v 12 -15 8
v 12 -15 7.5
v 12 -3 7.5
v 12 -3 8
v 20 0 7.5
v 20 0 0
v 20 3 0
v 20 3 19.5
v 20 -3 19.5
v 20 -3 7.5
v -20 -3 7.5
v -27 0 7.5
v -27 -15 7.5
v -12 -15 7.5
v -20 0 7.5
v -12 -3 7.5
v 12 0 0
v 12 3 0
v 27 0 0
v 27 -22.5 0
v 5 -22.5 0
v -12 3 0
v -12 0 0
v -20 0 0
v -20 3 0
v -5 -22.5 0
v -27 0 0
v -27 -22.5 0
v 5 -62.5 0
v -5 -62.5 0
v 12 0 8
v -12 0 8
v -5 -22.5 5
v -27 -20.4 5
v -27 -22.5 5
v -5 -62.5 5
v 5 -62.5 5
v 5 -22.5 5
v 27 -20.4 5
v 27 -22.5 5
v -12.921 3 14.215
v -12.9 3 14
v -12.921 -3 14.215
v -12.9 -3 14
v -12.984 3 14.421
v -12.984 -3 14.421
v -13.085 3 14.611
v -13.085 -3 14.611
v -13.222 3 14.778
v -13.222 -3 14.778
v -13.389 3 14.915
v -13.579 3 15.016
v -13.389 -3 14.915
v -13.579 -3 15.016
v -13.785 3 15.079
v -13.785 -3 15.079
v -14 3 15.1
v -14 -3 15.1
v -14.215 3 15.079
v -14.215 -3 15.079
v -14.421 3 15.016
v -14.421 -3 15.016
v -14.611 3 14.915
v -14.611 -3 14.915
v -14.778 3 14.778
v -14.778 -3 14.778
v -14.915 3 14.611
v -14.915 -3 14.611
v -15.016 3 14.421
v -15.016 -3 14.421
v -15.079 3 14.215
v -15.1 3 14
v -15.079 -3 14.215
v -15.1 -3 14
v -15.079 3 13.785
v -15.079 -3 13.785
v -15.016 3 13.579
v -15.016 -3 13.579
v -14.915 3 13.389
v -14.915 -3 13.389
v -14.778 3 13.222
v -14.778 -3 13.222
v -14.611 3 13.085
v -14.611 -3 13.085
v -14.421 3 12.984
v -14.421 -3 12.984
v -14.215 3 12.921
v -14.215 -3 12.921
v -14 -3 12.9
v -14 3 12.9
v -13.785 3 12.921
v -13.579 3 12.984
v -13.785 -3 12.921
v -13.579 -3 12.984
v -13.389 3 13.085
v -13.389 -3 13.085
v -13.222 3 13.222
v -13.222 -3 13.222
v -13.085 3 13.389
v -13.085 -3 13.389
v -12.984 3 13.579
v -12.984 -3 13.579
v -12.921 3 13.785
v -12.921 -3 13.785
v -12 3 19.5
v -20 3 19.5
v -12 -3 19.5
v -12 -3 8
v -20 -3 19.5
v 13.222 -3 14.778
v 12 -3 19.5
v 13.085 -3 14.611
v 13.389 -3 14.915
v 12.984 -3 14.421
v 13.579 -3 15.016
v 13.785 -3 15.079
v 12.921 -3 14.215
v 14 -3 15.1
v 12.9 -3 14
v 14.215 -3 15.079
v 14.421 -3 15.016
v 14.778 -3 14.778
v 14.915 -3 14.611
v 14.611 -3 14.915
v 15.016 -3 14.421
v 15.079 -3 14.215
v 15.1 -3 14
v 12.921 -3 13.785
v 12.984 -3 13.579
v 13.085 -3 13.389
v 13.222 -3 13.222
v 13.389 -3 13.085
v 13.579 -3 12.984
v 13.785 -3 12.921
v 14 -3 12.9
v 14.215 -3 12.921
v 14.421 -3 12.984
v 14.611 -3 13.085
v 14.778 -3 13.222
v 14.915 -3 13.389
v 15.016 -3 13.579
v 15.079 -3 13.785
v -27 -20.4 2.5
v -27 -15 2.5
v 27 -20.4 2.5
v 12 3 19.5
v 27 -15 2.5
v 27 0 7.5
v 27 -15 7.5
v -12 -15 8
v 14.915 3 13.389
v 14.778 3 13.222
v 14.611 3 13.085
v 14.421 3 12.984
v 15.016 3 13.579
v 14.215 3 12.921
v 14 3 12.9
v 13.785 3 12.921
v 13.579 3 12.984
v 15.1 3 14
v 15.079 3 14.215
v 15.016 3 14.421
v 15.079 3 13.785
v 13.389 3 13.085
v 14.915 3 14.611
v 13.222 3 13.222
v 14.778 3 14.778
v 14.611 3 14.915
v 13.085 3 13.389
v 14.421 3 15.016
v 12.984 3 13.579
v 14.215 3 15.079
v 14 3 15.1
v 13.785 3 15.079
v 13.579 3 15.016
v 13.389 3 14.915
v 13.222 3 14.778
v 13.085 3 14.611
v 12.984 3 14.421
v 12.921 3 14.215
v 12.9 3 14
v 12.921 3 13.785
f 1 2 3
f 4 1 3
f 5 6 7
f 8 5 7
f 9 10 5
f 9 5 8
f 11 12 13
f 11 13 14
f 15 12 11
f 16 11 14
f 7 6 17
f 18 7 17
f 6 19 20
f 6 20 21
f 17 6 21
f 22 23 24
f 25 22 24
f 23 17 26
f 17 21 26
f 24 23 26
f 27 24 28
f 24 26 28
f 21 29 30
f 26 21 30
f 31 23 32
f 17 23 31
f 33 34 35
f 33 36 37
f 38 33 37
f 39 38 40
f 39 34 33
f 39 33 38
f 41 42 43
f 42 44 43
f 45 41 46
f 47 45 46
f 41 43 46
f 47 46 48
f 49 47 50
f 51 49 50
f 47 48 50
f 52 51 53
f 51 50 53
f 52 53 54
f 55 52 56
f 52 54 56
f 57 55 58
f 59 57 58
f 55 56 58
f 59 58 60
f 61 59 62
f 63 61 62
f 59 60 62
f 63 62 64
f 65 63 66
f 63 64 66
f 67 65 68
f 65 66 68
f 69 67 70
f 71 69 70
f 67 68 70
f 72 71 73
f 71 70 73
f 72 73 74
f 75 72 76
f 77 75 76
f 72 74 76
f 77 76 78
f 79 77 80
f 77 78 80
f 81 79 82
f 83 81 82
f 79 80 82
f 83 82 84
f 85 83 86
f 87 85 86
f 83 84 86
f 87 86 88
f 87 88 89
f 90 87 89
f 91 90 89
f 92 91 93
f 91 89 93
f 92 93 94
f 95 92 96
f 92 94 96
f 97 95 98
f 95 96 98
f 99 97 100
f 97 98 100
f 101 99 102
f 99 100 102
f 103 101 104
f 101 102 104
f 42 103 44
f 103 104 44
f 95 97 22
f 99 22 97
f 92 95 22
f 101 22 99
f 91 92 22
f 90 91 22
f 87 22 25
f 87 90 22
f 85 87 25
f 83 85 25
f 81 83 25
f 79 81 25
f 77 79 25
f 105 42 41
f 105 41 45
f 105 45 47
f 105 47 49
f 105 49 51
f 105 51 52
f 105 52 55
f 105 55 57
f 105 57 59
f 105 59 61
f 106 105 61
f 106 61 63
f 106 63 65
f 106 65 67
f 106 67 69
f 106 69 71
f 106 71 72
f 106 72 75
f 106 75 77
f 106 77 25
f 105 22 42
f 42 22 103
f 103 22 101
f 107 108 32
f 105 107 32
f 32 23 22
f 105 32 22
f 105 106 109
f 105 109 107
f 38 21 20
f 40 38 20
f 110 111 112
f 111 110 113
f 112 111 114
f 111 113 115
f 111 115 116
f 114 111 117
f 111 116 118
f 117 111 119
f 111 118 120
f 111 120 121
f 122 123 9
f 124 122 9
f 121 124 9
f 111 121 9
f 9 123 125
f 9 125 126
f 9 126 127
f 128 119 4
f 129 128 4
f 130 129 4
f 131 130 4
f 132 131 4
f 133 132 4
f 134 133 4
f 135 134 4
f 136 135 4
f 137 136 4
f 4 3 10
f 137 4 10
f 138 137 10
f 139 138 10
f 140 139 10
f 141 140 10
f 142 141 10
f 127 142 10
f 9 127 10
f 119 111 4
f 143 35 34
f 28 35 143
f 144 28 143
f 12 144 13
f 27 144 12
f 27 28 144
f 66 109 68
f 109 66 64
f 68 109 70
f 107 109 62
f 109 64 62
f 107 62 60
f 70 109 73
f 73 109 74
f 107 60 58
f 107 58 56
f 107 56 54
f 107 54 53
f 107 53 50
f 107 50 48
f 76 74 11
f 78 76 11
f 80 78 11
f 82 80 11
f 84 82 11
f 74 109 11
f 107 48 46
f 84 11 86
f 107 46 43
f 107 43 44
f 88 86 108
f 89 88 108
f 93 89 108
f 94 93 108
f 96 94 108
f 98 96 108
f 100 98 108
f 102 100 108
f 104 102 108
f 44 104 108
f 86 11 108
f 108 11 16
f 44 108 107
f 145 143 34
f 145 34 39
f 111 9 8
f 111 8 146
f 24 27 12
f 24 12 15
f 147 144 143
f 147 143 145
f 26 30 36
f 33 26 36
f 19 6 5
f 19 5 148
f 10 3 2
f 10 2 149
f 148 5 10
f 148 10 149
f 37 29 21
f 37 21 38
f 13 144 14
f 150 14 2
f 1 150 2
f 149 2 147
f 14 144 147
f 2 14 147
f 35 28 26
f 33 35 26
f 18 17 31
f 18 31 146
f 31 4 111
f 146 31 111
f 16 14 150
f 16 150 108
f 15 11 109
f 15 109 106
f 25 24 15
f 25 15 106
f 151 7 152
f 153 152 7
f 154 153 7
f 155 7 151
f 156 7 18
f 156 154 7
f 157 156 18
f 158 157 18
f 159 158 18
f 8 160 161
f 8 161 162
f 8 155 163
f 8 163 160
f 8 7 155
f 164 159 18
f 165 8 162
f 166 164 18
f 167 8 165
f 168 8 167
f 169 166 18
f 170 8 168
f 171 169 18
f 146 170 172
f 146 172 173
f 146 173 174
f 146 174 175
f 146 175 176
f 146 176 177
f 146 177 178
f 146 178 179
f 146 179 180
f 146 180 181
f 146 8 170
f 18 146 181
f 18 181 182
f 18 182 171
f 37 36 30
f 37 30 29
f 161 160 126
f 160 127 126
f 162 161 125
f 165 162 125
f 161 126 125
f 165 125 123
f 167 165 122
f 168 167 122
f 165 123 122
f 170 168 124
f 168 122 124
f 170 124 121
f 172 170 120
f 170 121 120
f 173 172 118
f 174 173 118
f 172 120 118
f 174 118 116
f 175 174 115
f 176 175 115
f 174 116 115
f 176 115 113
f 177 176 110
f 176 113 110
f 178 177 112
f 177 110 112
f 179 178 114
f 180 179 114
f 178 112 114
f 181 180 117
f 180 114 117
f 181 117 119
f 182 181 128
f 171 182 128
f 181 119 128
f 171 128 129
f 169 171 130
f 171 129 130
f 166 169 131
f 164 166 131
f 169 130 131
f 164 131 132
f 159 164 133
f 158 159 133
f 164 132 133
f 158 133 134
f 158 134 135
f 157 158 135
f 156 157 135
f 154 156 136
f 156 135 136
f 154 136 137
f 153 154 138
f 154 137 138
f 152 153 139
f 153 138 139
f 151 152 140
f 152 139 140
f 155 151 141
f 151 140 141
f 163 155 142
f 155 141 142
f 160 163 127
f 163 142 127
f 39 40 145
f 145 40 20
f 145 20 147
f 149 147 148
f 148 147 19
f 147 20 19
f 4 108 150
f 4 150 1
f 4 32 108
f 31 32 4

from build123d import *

# Parameters (mm, degrees)
SKETCH_W        = 54
SKETCH_H        = 22.5
PAD_DEPTH       = 2.5
SKETCH001_W     = 54
SKETCH001_H     = 2.1
PAD001_DEPTH    = 2.5
SKETCH002_W     = 10
SKETCH002_H     = 5
PAD002_DEPTH    = 40
SKETCH003_W     = 54
SKETCH003_H     = 15
PAD003_DEPTH    = 5
SKETCH004_W     = 8
SKETCH004_H     = 3
PAD004_DEPTH    = 12
SKETCH005_R     = 1.1
POCKET_DEPTH    = 10
SKETCH006_W     = 8
SKETCH006_H     = 19.5
PAD005_DEPTH    = 3
SKETCH007_R     = 1.1
POCKET001_DEPTH = 5
SKETCH008_W     = 24
SKETCH008_H     = 15
PAD006_DEPTH    = 0.5


with BuildPart() as part:
    # Sketch → Pad (new body)
    with BuildSketch(Plane.XY):
        with Locations((0, -11.25)):
            Rectangle(SKETCH_W, SKETCH_H)
    extrude(amount=PAD_DEPTH)

    # Sketch001 (on Face6 of Pad) → Pad001 (join)
    with BuildSketch(Plane.XY.offset(2.5)):
        with Locations((0, -21.45)):
            Rectangle(SKETCH001_W, SKETCH001_H)
    extrude(amount=PAD001_DEPTH)

    # Sketch002 (on Face10 of Pad001) → Pad002 (join)
    with BuildSketch(Plane.XZ.offset(22.5)):
        with Locations((0, 2.5)):
            Rectangle(SKETCH002_W, SKETCH002_H)
    extrude(amount=PAD002_DEPTH)

    # Sketch003 (on Face5 of Pad002) → Pad003 (join)
    with BuildSketch(Plane.XY.offset(2.5)):
        with Locations((0, -7.5)):
            Rectangle(SKETCH003_W, SKETCH003_H)
    extrude(amount=PAD003_DEPTH)

    # Sketch004 (on Face14 of Pad003) → Pad004 (join)
    with BuildSketch(Plane.XY.offset(7.5)):
        with Locations((16, -1.5)):
            Rectangle(SKETCH004_W, SKETCH004_H)
        with Locations((-16, -1.5)):
            Rectangle(SKETCH004_W, SKETCH004_H)
    extrude(amount=PAD004_DEPTH)

    # Sketch005 (on Face26 of Pad004) → Pocket (cut)
    with BuildSketch(Plane.XZ.offset(3)):
        with Locations((-14, 14)):
            Circle(SKETCH005_R)
        with Locations((14, 14)):
            Circle(SKETCH005_R)
    extrude(amount=-POCKET_DEPTH, mode=Mode.SUBTRACT)

    # Sketch006 (on Face5 of Pocket) → Pad005 (join)
    with BuildSketch(Plane(origin=(0, 0, 0), x_dir=(-1, 0, 0), z_dir=(0, 1, 0))):
        with Locations((-16, 9.75)):
            Rectangle(SKETCH006_W, SKETCH006_H)
        with Locations((16, 9.75)):
            Rectangle(SKETCH006_W, SKETCH006_H)
    extrude(amount=PAD005_DEPTH)

    # Sketch007 (on Face49 of Pad005) → Pocket001 (cut)
    with BuildSketch(Plane.XZ):
        with Locations((-14, 14)):
            Circle(SKETCH007_R)
        with Locations((14, 14)):
            Circle(SKETCH007_R)
    extrude(amount=-POCKET001_DEPTH, mode=Mode.SUBTRACT)

    # Sketch008 (on Face17 of Pocket001) → Pad006 (join)
    with BuildSketch(Plane.XY.offset(7.5)):
        with Locations((0, -7.5)):
            Rectangle(SKETCH008_W, SKETCH008_H)
    extrude(amount=PAD006_DEPTH)


solid = part.part
